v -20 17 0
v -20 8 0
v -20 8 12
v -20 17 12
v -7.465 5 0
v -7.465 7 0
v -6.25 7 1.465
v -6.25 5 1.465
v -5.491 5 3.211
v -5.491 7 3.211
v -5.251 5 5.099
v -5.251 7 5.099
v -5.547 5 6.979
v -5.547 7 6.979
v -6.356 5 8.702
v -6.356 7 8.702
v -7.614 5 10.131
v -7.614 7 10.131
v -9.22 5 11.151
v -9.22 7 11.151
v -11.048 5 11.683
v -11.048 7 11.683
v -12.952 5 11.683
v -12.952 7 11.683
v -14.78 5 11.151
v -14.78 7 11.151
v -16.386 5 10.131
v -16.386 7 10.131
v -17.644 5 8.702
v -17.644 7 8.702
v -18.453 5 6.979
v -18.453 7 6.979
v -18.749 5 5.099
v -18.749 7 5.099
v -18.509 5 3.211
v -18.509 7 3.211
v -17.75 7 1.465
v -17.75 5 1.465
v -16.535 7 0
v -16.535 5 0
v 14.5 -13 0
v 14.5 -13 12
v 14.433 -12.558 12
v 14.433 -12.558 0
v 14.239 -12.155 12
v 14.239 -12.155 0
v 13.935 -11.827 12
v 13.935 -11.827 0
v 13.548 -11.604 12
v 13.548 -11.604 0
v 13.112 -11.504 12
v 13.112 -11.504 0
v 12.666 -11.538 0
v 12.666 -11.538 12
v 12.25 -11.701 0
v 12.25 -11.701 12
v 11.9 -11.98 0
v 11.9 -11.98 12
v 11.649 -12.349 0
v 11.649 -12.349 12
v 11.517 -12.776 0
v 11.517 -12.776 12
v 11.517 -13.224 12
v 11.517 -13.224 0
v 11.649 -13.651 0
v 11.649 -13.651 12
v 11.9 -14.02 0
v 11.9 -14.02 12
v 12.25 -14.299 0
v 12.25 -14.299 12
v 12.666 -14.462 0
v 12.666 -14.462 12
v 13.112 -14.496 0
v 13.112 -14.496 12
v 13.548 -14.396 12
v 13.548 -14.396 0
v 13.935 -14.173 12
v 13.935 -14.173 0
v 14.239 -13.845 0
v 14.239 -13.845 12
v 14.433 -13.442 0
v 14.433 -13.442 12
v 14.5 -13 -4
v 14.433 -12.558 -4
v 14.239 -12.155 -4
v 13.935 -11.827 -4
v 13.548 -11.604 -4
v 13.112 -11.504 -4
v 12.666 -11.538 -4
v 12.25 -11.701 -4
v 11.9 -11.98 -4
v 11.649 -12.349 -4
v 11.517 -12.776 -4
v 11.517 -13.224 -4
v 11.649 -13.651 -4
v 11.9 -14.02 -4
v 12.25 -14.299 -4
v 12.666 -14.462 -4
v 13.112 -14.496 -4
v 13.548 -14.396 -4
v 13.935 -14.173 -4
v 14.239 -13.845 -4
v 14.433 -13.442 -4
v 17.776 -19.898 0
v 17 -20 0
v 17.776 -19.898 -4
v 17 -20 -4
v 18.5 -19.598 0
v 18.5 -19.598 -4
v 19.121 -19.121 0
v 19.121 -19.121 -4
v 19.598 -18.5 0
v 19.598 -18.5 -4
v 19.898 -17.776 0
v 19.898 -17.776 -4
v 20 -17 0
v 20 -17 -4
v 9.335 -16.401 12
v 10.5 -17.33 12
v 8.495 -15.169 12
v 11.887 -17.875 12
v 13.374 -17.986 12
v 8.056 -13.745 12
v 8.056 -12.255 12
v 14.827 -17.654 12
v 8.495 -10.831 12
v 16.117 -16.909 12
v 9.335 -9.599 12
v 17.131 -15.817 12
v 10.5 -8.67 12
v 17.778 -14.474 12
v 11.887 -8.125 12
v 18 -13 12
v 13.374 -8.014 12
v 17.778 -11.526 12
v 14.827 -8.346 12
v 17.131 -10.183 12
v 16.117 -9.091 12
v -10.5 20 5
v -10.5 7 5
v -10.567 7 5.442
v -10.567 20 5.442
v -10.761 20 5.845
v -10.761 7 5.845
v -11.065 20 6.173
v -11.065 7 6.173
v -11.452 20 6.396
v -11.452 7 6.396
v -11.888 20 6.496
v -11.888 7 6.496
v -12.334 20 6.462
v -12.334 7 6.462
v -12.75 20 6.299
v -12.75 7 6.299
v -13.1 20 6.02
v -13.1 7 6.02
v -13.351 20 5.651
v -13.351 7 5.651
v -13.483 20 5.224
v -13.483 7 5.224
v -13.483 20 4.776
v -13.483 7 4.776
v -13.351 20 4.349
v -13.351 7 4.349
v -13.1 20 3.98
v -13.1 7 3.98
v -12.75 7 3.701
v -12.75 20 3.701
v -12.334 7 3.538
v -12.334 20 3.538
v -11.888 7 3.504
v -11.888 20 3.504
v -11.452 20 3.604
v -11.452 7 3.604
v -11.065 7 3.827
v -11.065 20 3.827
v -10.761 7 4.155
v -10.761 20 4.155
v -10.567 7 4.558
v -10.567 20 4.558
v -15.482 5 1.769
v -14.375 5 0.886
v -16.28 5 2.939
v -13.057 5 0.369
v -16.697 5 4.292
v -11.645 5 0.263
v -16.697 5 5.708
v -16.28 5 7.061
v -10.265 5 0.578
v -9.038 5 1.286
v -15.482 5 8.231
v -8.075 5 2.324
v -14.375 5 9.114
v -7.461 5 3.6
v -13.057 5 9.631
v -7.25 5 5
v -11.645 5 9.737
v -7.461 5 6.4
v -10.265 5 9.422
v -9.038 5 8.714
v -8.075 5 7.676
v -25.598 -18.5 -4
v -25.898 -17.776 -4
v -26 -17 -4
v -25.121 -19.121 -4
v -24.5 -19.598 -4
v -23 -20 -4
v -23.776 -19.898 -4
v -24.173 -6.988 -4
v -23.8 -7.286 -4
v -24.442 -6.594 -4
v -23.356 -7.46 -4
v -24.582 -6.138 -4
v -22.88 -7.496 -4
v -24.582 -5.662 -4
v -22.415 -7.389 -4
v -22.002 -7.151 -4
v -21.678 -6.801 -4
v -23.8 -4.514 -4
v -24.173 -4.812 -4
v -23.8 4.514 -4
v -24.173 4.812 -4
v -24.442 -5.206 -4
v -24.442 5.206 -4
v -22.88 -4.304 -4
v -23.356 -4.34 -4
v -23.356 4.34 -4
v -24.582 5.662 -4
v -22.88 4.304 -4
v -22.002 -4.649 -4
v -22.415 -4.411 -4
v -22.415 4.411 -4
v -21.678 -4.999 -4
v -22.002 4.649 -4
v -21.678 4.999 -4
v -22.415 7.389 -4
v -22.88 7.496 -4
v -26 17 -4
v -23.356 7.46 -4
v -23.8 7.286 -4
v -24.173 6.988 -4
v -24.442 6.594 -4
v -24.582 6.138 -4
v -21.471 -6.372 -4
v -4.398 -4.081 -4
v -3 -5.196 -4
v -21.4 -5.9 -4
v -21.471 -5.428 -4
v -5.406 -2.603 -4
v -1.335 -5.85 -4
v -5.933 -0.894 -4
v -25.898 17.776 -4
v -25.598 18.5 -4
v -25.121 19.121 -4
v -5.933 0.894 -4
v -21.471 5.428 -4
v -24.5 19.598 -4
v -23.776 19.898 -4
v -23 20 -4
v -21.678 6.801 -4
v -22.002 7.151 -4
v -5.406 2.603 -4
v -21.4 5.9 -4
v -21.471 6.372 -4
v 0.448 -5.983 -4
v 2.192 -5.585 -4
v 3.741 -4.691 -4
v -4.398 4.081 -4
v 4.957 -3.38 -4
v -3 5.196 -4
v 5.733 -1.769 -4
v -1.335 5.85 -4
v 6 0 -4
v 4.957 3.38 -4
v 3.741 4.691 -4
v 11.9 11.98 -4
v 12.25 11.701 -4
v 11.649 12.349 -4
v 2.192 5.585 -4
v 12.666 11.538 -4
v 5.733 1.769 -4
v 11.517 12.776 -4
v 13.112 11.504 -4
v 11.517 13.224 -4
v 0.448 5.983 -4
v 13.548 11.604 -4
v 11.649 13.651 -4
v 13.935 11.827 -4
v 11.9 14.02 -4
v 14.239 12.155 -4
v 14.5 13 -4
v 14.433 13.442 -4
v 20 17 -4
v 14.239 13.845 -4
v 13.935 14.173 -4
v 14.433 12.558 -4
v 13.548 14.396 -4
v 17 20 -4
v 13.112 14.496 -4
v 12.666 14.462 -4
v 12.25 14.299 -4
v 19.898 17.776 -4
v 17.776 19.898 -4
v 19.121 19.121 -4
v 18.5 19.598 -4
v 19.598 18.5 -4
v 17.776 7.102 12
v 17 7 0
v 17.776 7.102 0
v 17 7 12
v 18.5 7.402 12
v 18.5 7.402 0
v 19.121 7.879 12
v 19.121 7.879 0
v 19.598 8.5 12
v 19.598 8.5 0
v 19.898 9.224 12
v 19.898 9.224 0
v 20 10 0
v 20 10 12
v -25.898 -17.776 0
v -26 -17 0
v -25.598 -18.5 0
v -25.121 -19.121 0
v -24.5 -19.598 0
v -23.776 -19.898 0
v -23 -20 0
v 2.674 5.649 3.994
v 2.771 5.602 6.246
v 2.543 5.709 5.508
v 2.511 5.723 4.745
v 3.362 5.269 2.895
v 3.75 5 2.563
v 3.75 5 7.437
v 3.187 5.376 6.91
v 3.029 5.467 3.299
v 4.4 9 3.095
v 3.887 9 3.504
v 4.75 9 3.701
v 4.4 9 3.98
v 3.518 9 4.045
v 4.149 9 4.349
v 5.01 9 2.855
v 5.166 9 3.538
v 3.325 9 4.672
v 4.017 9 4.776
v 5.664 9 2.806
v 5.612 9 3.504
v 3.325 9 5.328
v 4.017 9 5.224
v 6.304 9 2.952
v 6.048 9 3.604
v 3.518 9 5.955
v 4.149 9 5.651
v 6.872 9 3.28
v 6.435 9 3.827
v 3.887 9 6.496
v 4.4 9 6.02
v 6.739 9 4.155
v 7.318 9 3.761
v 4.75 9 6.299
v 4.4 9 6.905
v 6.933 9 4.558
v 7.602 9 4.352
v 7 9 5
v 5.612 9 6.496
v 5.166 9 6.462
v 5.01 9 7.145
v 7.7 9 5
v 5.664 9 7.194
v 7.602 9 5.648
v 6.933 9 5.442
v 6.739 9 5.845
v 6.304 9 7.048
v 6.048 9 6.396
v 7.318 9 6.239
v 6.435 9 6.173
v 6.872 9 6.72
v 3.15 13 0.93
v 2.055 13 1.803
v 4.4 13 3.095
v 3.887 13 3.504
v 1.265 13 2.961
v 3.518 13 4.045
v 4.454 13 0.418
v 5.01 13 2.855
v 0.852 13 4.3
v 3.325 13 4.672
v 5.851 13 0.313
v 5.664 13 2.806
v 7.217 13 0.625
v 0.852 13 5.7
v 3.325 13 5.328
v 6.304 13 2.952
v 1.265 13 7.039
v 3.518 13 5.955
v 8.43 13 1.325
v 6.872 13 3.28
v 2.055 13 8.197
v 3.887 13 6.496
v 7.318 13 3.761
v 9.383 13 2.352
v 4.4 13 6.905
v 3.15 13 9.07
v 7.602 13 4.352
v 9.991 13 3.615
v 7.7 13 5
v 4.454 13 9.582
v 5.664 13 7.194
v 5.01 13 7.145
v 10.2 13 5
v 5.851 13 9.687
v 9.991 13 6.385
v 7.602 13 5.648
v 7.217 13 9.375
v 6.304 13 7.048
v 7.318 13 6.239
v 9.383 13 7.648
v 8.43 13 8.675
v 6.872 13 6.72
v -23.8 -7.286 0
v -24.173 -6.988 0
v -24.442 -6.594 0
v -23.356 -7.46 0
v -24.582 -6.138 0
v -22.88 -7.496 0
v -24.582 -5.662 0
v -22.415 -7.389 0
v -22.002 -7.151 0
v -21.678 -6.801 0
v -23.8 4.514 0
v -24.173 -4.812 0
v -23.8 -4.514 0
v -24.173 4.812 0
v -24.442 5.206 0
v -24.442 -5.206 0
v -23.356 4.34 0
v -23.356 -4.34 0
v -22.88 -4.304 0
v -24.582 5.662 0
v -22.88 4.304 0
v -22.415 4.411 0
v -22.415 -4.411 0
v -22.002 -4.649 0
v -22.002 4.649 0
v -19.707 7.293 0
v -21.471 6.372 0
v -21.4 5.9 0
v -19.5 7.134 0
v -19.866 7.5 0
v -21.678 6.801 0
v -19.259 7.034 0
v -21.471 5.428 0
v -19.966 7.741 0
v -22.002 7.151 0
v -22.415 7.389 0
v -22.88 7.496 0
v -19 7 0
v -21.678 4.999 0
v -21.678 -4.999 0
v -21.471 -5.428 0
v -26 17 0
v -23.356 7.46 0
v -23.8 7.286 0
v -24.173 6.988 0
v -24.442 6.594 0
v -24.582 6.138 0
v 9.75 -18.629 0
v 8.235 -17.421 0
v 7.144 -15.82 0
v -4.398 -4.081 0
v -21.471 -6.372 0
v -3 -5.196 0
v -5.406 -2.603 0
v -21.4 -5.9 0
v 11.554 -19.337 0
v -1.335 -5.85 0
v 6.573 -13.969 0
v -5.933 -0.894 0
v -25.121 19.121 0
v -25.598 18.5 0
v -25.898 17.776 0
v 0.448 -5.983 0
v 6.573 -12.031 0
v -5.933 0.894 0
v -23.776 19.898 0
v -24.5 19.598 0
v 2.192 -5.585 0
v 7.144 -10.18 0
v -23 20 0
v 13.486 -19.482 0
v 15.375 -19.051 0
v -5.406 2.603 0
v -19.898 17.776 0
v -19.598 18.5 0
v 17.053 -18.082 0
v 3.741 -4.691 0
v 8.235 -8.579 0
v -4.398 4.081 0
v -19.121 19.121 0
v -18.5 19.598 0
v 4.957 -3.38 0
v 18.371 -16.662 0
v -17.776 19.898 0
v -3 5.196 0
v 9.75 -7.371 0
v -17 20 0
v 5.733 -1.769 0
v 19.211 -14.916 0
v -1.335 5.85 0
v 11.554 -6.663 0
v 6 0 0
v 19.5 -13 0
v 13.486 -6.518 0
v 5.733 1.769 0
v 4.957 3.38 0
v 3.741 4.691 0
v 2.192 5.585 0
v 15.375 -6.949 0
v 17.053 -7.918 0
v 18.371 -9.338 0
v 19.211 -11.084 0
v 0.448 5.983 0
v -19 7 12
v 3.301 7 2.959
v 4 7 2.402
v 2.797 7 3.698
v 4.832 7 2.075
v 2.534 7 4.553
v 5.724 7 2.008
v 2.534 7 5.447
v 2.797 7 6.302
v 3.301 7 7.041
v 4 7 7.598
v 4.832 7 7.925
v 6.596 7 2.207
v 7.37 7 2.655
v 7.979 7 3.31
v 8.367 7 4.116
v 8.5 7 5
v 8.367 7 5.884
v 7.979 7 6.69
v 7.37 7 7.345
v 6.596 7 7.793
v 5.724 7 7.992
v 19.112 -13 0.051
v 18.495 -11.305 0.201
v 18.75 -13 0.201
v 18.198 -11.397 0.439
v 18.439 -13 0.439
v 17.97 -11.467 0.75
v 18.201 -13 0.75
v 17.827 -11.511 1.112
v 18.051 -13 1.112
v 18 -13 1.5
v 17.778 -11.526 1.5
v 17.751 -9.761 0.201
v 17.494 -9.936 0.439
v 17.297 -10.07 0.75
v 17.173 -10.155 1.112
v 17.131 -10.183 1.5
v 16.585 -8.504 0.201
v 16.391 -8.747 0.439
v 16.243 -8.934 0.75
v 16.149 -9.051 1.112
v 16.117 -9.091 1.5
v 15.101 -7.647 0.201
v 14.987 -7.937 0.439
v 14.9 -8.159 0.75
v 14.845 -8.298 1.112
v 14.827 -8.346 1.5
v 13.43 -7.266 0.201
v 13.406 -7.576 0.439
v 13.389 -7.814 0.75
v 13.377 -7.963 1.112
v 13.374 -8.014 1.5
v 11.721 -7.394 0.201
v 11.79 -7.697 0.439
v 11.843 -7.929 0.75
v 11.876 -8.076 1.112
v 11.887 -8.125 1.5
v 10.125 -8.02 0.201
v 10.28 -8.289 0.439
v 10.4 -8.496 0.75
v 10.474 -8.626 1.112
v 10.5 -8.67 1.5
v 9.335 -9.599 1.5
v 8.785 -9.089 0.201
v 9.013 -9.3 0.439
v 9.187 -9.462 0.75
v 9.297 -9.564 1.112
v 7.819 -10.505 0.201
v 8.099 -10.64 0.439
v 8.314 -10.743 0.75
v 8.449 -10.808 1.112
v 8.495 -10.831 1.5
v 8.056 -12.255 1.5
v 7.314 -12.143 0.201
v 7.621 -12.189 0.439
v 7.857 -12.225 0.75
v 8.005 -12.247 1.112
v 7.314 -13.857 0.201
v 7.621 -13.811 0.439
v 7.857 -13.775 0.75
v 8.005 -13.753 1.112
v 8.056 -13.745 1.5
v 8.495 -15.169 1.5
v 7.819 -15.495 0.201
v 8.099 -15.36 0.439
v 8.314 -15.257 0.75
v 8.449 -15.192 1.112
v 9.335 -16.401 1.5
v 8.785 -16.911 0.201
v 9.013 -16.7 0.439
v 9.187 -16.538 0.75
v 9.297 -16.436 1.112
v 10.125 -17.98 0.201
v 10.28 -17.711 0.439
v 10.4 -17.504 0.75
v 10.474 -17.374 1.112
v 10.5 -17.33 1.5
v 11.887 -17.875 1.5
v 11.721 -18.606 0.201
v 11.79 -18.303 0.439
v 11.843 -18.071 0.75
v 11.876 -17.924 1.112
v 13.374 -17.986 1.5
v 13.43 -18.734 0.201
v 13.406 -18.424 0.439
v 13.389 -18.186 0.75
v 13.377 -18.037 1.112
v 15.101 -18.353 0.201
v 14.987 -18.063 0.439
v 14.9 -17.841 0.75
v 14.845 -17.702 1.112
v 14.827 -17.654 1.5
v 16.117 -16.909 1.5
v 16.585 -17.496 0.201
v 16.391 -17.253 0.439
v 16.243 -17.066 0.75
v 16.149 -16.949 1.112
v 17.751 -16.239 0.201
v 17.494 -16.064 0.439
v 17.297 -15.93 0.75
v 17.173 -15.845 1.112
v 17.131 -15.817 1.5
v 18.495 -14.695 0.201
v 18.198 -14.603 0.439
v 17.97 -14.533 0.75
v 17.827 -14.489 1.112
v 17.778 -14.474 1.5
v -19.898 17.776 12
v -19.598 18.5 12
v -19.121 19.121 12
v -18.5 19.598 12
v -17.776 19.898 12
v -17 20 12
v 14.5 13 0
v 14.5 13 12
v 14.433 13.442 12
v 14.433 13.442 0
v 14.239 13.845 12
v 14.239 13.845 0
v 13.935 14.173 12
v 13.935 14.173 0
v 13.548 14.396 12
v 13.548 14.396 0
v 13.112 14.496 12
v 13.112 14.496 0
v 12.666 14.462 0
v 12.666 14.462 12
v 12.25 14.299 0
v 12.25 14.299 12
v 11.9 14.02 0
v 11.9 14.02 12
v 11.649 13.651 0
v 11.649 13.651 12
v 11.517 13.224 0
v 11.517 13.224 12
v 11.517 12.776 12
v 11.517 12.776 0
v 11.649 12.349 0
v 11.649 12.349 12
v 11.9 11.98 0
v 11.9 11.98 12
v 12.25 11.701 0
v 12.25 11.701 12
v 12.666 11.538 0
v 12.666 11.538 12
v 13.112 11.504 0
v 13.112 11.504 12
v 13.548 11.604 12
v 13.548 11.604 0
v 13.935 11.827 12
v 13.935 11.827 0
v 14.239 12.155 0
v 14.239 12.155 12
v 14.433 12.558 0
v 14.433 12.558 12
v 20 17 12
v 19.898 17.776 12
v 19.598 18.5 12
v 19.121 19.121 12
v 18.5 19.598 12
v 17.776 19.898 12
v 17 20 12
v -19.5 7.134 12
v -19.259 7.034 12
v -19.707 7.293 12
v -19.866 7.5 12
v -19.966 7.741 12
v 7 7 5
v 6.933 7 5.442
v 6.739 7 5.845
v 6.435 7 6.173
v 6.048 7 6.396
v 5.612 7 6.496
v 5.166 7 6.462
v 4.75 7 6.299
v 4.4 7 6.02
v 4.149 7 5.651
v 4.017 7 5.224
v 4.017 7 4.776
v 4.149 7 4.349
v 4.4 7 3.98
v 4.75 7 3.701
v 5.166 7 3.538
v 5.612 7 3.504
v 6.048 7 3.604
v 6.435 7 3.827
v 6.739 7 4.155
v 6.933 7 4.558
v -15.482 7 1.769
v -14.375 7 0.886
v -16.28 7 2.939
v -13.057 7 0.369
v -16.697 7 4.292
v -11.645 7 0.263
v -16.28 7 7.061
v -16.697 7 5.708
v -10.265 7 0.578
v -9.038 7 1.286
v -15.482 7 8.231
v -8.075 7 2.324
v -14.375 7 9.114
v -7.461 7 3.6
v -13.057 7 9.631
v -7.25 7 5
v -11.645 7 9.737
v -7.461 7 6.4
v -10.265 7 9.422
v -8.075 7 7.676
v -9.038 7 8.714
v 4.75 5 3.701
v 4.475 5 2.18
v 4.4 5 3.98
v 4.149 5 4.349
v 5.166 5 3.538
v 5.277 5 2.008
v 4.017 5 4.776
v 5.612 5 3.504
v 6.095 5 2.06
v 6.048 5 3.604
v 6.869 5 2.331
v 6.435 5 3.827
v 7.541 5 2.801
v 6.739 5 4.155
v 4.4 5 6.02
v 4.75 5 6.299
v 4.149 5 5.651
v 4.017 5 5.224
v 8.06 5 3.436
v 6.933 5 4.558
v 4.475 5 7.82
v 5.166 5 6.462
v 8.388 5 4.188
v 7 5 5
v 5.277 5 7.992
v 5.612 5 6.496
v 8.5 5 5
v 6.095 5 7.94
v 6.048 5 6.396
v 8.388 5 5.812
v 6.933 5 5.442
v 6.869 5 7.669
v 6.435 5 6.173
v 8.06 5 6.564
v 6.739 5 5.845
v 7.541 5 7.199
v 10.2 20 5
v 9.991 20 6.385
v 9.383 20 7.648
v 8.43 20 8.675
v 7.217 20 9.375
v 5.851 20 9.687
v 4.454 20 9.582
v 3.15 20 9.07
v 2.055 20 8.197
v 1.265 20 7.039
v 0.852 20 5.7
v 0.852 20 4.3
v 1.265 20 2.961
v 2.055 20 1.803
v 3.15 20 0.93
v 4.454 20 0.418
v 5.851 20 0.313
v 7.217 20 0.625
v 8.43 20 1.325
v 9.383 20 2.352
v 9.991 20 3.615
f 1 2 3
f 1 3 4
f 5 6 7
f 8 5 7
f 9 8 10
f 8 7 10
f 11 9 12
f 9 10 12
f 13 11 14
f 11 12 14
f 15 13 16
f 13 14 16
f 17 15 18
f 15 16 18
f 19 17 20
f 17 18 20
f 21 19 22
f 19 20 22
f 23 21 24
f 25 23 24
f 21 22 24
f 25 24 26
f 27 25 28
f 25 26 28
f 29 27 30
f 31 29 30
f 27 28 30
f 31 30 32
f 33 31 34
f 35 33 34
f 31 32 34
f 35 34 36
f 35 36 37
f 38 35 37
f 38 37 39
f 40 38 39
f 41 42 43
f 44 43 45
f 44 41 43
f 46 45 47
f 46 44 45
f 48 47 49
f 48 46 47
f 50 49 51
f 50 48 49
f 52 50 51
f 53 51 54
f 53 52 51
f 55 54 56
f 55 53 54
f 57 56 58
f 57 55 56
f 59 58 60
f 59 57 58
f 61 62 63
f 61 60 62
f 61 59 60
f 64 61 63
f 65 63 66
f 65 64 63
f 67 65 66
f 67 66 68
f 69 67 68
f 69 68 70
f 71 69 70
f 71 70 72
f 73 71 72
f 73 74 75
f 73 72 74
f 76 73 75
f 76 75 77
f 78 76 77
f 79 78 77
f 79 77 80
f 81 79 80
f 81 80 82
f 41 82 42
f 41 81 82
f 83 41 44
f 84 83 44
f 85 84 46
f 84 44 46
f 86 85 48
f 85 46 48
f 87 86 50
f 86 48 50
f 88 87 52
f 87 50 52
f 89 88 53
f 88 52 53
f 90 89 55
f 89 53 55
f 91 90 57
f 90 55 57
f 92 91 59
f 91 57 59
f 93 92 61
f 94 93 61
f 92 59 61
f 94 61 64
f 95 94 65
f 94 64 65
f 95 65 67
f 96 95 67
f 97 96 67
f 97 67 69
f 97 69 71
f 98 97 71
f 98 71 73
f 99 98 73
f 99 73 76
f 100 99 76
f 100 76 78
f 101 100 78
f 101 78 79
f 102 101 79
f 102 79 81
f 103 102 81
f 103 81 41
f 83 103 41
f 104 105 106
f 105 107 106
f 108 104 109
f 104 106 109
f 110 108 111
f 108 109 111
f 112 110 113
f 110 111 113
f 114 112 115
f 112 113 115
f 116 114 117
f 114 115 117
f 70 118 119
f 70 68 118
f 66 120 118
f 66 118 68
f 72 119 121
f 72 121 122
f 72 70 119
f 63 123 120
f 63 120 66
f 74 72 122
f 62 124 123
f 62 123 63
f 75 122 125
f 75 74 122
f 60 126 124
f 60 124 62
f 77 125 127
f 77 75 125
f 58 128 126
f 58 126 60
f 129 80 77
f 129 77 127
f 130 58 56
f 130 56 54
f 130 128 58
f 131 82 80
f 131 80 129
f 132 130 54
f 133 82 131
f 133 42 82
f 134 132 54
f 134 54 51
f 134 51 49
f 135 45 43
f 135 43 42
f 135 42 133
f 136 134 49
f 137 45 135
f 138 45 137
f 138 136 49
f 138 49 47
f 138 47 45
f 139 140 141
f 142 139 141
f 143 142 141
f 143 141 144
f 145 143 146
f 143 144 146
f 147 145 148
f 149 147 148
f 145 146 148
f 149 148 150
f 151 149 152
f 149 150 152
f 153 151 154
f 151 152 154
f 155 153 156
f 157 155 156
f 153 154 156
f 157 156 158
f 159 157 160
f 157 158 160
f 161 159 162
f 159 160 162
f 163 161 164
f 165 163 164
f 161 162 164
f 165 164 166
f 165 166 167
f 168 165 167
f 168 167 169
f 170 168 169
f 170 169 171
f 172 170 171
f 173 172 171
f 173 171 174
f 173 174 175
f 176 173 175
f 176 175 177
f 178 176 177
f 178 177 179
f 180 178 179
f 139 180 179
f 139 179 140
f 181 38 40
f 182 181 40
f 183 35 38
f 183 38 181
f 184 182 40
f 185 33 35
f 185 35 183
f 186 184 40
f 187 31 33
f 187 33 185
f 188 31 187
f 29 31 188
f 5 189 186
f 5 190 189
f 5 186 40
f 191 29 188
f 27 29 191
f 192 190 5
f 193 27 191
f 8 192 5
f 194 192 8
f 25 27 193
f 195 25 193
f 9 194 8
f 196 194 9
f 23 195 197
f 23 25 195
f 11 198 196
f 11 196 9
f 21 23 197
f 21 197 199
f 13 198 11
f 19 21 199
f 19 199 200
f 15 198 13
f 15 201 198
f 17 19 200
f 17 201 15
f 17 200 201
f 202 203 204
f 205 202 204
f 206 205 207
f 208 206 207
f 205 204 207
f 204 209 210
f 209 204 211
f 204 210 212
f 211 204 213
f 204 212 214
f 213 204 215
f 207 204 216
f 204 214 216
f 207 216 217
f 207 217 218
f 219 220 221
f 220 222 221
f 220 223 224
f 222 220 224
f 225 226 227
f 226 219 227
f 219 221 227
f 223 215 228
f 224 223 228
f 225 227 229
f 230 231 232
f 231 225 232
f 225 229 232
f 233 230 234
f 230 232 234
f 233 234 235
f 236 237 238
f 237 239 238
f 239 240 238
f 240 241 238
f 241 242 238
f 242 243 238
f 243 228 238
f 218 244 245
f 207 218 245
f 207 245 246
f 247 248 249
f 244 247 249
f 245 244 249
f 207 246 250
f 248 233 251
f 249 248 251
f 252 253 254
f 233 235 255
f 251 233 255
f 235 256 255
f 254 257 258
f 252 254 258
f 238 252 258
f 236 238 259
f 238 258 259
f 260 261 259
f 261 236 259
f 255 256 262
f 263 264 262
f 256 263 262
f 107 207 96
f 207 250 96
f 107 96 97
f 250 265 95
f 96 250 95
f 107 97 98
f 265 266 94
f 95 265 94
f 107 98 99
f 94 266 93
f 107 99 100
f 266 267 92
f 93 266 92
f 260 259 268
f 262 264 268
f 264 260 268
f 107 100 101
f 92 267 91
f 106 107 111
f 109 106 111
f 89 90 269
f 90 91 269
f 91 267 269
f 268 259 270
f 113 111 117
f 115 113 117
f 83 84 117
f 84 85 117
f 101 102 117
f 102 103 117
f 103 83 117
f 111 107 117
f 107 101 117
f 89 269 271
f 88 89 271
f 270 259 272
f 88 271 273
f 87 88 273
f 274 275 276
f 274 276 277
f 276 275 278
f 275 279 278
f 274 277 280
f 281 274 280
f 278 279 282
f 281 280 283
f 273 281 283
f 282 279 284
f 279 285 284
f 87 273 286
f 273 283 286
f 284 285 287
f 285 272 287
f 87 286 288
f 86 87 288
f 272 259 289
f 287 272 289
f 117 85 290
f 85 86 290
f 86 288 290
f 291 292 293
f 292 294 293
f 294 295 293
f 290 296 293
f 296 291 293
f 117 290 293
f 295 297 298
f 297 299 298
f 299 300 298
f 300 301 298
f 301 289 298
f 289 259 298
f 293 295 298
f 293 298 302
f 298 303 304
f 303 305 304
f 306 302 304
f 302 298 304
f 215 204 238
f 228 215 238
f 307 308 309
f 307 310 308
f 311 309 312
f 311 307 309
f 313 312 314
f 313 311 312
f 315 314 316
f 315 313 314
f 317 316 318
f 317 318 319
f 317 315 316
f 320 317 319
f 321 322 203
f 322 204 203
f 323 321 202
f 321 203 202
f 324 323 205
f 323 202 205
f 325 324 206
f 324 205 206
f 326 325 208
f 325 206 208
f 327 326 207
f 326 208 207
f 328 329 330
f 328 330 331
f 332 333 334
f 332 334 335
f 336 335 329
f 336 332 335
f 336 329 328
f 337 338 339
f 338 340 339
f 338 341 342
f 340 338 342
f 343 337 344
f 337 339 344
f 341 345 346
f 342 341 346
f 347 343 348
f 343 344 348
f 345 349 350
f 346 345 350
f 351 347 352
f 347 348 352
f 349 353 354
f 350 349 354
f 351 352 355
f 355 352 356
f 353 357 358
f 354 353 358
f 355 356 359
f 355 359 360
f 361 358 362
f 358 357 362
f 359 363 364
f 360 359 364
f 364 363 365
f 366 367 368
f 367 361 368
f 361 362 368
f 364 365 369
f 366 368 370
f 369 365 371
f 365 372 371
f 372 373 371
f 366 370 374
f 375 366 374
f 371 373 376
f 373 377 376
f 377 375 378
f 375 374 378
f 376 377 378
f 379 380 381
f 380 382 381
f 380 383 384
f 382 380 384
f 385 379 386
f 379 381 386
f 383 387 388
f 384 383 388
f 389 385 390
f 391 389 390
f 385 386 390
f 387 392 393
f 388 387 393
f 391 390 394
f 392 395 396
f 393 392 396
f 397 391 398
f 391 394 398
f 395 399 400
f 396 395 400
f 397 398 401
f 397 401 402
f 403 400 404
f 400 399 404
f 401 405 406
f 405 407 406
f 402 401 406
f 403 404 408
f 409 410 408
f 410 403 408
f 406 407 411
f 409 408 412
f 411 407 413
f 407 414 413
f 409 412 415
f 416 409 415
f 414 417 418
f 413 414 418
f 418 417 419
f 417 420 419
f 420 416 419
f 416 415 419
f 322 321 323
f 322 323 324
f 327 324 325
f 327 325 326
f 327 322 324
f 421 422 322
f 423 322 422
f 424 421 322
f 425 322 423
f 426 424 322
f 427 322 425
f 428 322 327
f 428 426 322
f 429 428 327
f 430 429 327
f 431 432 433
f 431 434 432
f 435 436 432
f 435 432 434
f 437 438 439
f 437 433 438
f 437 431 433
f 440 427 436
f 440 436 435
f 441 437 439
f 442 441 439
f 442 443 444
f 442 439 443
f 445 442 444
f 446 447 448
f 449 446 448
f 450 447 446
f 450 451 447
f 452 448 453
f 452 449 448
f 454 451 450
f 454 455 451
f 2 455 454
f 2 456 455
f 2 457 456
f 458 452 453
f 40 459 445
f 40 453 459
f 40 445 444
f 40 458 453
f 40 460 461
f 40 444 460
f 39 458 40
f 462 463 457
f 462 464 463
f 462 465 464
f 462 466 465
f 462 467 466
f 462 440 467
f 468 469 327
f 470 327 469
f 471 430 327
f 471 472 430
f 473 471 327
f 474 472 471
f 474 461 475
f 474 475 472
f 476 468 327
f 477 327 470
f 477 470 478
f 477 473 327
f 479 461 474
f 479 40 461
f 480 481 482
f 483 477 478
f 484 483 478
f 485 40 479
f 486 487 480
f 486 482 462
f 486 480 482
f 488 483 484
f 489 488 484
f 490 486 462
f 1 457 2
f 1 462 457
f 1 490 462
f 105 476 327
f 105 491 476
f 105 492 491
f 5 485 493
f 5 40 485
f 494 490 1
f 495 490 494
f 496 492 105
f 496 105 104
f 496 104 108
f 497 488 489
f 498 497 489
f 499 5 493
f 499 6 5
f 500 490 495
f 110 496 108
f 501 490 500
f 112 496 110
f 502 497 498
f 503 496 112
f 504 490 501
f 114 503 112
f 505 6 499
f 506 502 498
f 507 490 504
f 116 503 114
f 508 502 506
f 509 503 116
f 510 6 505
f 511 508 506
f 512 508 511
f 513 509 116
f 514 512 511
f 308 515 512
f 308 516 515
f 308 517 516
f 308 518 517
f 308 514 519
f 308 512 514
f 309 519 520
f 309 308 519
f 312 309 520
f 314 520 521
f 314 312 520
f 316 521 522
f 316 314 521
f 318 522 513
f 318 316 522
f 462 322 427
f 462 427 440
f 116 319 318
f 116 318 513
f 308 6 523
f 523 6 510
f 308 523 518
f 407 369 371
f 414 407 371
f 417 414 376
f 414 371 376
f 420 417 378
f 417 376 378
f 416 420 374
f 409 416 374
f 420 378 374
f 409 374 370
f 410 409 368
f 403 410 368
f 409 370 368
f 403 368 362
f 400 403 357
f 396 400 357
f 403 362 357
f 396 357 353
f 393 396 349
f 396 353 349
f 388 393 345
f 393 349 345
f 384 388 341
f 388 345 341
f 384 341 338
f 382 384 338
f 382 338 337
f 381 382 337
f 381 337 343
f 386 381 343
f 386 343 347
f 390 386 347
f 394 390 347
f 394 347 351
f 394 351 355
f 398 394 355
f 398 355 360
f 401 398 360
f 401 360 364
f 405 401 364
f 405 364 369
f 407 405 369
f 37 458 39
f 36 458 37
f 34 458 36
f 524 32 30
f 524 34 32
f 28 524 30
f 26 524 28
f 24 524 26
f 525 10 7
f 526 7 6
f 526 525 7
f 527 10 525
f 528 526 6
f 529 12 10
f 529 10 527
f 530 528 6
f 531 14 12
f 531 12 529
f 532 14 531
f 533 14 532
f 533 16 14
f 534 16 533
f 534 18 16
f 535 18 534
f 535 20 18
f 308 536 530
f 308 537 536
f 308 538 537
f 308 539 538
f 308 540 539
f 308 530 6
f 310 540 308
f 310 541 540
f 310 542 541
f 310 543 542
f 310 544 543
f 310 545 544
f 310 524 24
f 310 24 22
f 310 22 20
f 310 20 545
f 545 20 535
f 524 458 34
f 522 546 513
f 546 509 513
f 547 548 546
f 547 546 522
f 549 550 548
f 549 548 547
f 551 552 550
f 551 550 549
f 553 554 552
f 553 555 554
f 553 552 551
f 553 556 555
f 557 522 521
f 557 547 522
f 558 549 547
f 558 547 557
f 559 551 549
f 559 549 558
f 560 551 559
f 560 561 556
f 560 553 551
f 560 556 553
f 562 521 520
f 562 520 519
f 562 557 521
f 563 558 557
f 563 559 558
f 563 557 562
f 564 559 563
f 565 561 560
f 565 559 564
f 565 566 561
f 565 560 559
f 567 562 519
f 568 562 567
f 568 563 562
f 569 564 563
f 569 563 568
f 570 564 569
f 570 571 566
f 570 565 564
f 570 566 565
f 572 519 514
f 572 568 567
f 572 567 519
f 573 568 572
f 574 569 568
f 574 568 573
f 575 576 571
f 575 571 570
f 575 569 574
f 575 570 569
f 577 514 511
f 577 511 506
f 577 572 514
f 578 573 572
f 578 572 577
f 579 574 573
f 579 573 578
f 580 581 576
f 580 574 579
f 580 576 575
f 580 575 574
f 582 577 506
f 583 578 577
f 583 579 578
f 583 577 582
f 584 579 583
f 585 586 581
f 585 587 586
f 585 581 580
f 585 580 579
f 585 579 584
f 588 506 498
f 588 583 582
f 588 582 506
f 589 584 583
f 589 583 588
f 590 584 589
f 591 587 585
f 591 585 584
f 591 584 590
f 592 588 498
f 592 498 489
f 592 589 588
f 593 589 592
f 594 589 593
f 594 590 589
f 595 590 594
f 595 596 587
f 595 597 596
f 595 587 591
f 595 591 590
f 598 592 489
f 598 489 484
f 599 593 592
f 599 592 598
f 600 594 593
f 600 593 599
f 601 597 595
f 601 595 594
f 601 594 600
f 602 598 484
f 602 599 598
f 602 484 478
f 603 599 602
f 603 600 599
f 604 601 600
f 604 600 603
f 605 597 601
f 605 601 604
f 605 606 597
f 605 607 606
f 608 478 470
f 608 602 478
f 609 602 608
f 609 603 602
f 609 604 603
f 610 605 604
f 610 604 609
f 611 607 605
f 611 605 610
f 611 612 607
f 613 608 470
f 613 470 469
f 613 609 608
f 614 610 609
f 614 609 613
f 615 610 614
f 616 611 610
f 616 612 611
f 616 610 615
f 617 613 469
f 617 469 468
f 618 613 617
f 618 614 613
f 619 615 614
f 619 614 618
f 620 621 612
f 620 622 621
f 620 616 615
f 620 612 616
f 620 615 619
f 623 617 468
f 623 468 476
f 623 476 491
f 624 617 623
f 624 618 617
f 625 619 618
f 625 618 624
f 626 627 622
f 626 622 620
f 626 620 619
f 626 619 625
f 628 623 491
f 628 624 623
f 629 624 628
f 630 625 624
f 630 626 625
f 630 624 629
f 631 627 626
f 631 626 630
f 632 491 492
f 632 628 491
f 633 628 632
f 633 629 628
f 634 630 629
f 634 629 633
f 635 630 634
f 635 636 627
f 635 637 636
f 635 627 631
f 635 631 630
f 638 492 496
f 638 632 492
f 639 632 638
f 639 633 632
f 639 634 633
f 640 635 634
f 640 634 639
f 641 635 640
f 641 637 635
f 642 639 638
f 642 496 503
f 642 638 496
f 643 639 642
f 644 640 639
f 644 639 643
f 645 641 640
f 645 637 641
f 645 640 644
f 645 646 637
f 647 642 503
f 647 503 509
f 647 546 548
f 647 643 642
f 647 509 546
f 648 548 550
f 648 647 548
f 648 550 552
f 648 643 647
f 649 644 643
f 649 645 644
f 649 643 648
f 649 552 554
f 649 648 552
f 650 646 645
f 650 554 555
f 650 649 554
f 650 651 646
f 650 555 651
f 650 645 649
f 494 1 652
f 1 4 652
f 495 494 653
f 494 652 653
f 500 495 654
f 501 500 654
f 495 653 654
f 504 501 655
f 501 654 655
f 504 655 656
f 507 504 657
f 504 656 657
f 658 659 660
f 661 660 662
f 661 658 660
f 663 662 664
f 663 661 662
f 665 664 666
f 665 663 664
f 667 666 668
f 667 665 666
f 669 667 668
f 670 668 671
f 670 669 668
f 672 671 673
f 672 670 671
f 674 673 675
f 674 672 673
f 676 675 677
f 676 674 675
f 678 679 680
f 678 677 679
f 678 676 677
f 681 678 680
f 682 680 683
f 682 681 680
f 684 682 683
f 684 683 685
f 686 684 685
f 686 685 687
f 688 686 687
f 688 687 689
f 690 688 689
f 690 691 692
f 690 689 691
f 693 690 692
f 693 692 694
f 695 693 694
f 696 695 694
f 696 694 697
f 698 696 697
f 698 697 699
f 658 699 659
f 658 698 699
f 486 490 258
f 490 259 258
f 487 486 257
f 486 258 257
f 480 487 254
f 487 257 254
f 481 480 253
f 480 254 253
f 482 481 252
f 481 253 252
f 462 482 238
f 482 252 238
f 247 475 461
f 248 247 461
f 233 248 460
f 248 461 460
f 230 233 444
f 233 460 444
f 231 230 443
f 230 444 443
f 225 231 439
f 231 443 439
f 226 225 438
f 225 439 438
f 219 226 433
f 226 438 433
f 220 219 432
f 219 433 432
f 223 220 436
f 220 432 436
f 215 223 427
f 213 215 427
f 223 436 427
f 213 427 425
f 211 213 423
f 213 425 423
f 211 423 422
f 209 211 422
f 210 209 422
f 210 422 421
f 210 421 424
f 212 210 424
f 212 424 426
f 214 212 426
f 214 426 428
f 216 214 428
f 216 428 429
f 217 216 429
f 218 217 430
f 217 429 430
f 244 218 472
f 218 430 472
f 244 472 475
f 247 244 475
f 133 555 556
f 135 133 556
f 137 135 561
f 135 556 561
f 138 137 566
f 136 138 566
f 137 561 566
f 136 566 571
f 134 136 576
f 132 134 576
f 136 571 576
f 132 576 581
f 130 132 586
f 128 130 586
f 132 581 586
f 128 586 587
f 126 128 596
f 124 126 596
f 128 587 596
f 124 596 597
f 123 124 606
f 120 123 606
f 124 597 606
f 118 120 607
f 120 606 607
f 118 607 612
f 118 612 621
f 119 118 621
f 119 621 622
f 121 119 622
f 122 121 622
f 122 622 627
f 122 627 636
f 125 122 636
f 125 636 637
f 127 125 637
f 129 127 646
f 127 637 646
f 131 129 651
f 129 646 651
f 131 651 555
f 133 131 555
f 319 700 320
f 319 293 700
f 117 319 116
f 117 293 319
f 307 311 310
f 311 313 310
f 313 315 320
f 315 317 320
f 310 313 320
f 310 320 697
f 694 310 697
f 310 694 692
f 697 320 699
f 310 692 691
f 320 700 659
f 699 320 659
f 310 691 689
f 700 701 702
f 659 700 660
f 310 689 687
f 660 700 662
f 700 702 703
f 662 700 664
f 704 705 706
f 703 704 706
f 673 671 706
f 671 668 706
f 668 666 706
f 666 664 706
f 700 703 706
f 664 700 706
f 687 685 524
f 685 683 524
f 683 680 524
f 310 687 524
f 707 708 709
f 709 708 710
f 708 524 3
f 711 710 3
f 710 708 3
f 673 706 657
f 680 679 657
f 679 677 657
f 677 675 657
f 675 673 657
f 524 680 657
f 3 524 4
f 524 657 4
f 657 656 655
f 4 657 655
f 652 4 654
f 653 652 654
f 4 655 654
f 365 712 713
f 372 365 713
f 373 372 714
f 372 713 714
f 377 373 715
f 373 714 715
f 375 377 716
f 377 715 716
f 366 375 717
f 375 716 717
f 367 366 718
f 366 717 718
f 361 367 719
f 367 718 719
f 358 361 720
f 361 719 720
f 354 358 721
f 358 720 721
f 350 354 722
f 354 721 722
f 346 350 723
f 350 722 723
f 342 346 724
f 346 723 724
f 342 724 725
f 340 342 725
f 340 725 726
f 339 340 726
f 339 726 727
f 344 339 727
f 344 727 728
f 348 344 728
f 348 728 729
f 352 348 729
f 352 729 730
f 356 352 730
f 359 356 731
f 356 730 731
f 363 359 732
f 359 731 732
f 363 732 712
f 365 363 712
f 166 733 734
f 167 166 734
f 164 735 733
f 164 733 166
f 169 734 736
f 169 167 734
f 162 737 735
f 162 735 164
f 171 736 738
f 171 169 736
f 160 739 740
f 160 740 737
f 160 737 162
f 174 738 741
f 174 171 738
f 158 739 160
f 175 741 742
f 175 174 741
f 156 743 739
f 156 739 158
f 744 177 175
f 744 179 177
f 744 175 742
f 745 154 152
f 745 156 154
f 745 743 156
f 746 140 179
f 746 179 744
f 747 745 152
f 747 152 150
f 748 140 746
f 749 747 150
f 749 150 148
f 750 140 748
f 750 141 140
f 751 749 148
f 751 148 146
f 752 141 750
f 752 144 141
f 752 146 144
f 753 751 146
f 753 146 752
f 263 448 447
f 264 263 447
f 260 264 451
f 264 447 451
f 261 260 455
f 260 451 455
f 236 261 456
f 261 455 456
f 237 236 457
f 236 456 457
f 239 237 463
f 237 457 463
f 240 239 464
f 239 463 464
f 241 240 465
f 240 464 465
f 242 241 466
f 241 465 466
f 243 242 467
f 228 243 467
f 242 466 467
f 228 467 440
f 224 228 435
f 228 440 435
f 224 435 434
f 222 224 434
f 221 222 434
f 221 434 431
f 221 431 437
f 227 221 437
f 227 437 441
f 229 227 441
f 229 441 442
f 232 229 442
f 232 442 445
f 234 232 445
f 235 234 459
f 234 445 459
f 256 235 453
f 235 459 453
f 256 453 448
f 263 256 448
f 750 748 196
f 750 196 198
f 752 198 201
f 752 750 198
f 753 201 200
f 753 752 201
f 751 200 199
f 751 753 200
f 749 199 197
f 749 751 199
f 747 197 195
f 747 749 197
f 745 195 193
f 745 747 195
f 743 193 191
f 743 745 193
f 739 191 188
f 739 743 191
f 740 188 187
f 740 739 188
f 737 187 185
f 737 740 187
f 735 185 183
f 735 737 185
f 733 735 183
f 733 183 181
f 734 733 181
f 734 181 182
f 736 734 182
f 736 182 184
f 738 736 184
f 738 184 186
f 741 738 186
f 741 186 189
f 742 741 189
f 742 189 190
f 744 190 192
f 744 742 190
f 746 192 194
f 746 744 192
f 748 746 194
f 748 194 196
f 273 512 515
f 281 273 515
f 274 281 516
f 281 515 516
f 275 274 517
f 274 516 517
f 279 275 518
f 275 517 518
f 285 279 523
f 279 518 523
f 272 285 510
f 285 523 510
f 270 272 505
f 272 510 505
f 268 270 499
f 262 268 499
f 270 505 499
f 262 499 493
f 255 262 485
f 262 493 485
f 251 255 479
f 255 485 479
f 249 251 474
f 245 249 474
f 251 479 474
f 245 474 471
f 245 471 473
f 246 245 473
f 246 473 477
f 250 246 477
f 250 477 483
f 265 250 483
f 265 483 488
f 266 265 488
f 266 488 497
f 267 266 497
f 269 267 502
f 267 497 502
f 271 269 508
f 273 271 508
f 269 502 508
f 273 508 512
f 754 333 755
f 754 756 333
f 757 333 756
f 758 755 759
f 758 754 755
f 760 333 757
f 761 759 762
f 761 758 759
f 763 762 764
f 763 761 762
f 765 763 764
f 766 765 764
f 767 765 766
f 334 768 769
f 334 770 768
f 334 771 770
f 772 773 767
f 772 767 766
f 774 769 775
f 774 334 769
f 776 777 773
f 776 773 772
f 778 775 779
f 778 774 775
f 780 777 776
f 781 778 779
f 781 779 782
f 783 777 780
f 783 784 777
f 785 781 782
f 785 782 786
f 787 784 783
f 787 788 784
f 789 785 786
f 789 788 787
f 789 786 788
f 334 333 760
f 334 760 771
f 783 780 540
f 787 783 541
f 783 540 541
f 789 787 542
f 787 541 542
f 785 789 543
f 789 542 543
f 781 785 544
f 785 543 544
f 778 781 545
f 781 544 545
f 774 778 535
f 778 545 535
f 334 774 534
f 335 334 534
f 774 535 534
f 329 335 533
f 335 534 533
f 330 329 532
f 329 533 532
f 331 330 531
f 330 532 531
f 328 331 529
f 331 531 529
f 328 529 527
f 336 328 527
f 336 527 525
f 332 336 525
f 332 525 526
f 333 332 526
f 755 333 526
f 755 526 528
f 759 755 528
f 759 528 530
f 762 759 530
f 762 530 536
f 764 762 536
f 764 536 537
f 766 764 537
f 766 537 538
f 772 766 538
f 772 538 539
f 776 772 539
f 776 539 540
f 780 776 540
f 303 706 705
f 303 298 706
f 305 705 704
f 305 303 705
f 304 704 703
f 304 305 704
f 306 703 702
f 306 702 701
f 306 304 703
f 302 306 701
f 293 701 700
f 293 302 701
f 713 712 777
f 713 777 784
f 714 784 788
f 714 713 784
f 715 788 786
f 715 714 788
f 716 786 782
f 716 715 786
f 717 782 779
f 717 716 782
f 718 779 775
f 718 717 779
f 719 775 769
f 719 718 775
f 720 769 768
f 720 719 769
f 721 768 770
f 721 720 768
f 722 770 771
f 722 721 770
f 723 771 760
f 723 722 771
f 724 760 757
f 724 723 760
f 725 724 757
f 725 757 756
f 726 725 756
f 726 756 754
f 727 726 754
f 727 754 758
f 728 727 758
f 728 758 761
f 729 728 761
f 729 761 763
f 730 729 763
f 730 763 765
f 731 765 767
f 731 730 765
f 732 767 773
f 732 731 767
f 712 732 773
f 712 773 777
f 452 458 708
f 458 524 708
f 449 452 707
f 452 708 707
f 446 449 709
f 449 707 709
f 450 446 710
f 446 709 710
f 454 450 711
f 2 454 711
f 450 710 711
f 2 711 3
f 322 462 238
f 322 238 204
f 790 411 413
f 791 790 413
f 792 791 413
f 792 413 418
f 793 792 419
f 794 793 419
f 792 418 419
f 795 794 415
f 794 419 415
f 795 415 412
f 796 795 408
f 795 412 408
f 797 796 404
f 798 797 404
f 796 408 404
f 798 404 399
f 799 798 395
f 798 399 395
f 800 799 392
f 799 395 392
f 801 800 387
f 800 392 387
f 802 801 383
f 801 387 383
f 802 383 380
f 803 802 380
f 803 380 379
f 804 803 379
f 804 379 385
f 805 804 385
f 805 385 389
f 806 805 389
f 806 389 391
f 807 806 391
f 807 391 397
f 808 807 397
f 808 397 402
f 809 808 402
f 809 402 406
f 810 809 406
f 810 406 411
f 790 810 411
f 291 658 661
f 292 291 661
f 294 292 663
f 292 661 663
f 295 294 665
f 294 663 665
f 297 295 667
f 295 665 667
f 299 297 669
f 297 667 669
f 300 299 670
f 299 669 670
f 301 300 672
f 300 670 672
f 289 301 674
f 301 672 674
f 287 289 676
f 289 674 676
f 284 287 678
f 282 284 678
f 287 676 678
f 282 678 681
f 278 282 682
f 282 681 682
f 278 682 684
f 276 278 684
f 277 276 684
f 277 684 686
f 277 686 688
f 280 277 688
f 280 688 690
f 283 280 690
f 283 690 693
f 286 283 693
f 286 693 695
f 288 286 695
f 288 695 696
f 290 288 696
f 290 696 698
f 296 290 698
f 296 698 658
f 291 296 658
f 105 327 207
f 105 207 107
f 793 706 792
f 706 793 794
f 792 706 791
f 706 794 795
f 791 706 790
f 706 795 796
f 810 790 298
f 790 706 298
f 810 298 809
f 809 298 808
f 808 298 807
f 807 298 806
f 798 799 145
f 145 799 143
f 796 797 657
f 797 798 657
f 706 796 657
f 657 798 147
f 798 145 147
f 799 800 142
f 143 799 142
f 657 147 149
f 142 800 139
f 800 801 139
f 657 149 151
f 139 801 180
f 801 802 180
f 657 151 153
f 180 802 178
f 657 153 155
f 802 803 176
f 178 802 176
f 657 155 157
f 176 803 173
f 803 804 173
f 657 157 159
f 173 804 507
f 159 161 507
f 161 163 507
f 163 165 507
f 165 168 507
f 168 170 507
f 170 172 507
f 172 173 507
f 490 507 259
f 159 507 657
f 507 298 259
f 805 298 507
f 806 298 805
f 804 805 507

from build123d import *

# Parameters (mm, degrees)
SKETCH_R             = 1.6
SKETCH_R_2           = 6
PAD_DEPTH            = 4
SKETCH001_R          = 5
PAD001_DEPTH         = 12
SKETCH002_R          = 4.7
POCKET_DEPTH         = 13.001
SKETCH004_R          = 1.5
POCKET002_DEPTH      = 13.001
SKETCH005_R          = 1.5
POCKET003_DEPTH      = 4.001
POCKET003_DEPTH_BACK = 12.001
SKETCH006_R          = 4.7
SKETCH006_R_2        = 2.2
PAD002_DEPTH         = 6
SKETCH007_R          = 3
SKETCH007_R_2        = 1.5
PAD003_DEPTH         = 2
PAD003_DEPTH_BACK    = 2
SKETCH003_R          = 4.75
PAD004_DEPTH         = 2
SKETCH008_R          = 6.25
POCKET004_DEPTH      = 12.001
FILLET_R             = 1.5
FILLET001_R          = 3
FILLET002_R          = 1


with BuildPart() as part:
    # Sketch → Pad (new body)
    with BuildSketch(Plane.XY):
        Polygon((0, 20), (-26, 20), (-26, 0), (-26, -20), (0, -20), (20, -20), (20, 0), (20, 20), align=None)
        with Locations((-23, 5.9)):
            Circle(SKETCH_R, mode=Mode.SUBTRACT)
        with Locations((-23, -5.9)):
            Circle(SKETCH_R, mode=Mode.SUBTRACT)
        Circle(SKETCH_R_2, mode=Mode.SUBTRACT)
    extrude(amount=-PAD_DEPTH)

    # Sketch001 → Pad001 (join)
    with BuildSketch(Plane.XY):
        with Locations((13, -13)):
            Circle(SKETCH001_R)
        Polygon((0, 20), (20, 20), (20, 7), (0, 7), (-20, 7), (-20, 20), align=None)
    extrude(amount=PAD001_DEPTH)

    # Sketch002 (on DatumPlane) → Pocket (cut, through all)
    with BuildSketch(Plane.XZ.offset(-7)):
        with Locations((5.5, 5)):
            Circle(SKETCH002_R)
    extrude(amount=-POCKET_DEPTH, mode=Mode.SUBTRACT)

    # Sketch004 (on DatumPlane) → Pocket002 (cut, through all)
    with BuildSketch(Plane.XZ.offset(-7)):
        with Locations((-12, 5)):
            Circle(SKETCH004_R)
    extrude(amount=-POCKET002_DEPTH, mode=Mode.SUBTRACT)

    # Sketch005 → Pocket003 (cut, two sides)
    with BuildSketch(Plane.XY) as pocket003_sk:
        with Locations((13, -13)):
            Circle(SKETCH005_R)
        with Locations((13, 13)):
            Circle(SKETCH005_R)
    extrude(amount=-POCKET003_DEPTH, mode=Mode.SUBTRACT)
    extrude(pocket003_sk.sketch, amount=POCKET003_DEPTH_BACK, mode=Mode.SUBTRACT)

    # Sketch006 (on DatumPlane) → Pad002 (join)
    with BuildSketch(Plane.XZ.offset(-7)):
        with Locations((5.5, 5)):
            Circle(SKETCH006_R)
        with Locations((5.5, 5)):
            Circle(SKETCH006_R_2, mode=Mode.SUBTRACT)
    extrude(amount=-PAD002_DEPTH)

    # Sketch007 (on DatumPlane) → Pad003 (join, two sides)
    with BuildSketch(Plane.XZ.offset(-7)) as pad003_sk:
        with Locations((5.5, 5)):
            Circle(SKETCH007_R)
        with Locations((5.5, 5)):
            Circle(SKETCH007_R_2, mode=Mode.SUBTRACT)
    extrude(amount=PAD003_DEPTH)
    extrude(pad003_sk.sketch, amount=-PAD003_DEPTH_BACK)

    # Sketch003 (on DatumPlane) → Pad004 (join)
    with BuildSketch(Plane.XZ.offset(-7)):
        with BuildLine():
            ThreePointArc((-7.465411, 0), (-12, 11.75), (-16.534589, 0))
            Line((-16.534589, 0), (-7.465411, 0))
        make_face()
        with Locations((-12, 5)):
            Circle(SKETCH003_R, mode=Mode.SUBTRACT)
    extrude(amount=PAD004_DEPTH)

    # Sketch008 → Pocket004 (cut, through all)
    with BuildSketch(Plane.XY):
        Circle(SKETCH008_R)
    extrude(amount=POCKET004_DEPTH, mode=Mode.SUBTRACT)

    # Fillet
    fillet_edges = [part.edges().sort_by_distance(p)[0] for p in [
        (8, -13, 0),
    ]]
    fillet(fillet_edges, radius=FILLET_R)

    # Fillet001
    fillet001_edges = [part.edges().sort_by_distance(p)[0] for p in [
        (-26, -20, -2),
        (20, -20, -2),
        (20, 20, -2),
        (-26, 20, -2),
        (20, 7, 6),
        (-20, 20, 6),
    ]]
    fillet(fillet001_edges, radius=FILLET001_R)

    # Fillet002
    fillet002_edges = [part.edges().sort_by_distance(p)[0] for p in [
        (-20, 7, 6),
    ]]
    fillet(fillet002_edges, radius=FILLET002_R)


solid = part.part
